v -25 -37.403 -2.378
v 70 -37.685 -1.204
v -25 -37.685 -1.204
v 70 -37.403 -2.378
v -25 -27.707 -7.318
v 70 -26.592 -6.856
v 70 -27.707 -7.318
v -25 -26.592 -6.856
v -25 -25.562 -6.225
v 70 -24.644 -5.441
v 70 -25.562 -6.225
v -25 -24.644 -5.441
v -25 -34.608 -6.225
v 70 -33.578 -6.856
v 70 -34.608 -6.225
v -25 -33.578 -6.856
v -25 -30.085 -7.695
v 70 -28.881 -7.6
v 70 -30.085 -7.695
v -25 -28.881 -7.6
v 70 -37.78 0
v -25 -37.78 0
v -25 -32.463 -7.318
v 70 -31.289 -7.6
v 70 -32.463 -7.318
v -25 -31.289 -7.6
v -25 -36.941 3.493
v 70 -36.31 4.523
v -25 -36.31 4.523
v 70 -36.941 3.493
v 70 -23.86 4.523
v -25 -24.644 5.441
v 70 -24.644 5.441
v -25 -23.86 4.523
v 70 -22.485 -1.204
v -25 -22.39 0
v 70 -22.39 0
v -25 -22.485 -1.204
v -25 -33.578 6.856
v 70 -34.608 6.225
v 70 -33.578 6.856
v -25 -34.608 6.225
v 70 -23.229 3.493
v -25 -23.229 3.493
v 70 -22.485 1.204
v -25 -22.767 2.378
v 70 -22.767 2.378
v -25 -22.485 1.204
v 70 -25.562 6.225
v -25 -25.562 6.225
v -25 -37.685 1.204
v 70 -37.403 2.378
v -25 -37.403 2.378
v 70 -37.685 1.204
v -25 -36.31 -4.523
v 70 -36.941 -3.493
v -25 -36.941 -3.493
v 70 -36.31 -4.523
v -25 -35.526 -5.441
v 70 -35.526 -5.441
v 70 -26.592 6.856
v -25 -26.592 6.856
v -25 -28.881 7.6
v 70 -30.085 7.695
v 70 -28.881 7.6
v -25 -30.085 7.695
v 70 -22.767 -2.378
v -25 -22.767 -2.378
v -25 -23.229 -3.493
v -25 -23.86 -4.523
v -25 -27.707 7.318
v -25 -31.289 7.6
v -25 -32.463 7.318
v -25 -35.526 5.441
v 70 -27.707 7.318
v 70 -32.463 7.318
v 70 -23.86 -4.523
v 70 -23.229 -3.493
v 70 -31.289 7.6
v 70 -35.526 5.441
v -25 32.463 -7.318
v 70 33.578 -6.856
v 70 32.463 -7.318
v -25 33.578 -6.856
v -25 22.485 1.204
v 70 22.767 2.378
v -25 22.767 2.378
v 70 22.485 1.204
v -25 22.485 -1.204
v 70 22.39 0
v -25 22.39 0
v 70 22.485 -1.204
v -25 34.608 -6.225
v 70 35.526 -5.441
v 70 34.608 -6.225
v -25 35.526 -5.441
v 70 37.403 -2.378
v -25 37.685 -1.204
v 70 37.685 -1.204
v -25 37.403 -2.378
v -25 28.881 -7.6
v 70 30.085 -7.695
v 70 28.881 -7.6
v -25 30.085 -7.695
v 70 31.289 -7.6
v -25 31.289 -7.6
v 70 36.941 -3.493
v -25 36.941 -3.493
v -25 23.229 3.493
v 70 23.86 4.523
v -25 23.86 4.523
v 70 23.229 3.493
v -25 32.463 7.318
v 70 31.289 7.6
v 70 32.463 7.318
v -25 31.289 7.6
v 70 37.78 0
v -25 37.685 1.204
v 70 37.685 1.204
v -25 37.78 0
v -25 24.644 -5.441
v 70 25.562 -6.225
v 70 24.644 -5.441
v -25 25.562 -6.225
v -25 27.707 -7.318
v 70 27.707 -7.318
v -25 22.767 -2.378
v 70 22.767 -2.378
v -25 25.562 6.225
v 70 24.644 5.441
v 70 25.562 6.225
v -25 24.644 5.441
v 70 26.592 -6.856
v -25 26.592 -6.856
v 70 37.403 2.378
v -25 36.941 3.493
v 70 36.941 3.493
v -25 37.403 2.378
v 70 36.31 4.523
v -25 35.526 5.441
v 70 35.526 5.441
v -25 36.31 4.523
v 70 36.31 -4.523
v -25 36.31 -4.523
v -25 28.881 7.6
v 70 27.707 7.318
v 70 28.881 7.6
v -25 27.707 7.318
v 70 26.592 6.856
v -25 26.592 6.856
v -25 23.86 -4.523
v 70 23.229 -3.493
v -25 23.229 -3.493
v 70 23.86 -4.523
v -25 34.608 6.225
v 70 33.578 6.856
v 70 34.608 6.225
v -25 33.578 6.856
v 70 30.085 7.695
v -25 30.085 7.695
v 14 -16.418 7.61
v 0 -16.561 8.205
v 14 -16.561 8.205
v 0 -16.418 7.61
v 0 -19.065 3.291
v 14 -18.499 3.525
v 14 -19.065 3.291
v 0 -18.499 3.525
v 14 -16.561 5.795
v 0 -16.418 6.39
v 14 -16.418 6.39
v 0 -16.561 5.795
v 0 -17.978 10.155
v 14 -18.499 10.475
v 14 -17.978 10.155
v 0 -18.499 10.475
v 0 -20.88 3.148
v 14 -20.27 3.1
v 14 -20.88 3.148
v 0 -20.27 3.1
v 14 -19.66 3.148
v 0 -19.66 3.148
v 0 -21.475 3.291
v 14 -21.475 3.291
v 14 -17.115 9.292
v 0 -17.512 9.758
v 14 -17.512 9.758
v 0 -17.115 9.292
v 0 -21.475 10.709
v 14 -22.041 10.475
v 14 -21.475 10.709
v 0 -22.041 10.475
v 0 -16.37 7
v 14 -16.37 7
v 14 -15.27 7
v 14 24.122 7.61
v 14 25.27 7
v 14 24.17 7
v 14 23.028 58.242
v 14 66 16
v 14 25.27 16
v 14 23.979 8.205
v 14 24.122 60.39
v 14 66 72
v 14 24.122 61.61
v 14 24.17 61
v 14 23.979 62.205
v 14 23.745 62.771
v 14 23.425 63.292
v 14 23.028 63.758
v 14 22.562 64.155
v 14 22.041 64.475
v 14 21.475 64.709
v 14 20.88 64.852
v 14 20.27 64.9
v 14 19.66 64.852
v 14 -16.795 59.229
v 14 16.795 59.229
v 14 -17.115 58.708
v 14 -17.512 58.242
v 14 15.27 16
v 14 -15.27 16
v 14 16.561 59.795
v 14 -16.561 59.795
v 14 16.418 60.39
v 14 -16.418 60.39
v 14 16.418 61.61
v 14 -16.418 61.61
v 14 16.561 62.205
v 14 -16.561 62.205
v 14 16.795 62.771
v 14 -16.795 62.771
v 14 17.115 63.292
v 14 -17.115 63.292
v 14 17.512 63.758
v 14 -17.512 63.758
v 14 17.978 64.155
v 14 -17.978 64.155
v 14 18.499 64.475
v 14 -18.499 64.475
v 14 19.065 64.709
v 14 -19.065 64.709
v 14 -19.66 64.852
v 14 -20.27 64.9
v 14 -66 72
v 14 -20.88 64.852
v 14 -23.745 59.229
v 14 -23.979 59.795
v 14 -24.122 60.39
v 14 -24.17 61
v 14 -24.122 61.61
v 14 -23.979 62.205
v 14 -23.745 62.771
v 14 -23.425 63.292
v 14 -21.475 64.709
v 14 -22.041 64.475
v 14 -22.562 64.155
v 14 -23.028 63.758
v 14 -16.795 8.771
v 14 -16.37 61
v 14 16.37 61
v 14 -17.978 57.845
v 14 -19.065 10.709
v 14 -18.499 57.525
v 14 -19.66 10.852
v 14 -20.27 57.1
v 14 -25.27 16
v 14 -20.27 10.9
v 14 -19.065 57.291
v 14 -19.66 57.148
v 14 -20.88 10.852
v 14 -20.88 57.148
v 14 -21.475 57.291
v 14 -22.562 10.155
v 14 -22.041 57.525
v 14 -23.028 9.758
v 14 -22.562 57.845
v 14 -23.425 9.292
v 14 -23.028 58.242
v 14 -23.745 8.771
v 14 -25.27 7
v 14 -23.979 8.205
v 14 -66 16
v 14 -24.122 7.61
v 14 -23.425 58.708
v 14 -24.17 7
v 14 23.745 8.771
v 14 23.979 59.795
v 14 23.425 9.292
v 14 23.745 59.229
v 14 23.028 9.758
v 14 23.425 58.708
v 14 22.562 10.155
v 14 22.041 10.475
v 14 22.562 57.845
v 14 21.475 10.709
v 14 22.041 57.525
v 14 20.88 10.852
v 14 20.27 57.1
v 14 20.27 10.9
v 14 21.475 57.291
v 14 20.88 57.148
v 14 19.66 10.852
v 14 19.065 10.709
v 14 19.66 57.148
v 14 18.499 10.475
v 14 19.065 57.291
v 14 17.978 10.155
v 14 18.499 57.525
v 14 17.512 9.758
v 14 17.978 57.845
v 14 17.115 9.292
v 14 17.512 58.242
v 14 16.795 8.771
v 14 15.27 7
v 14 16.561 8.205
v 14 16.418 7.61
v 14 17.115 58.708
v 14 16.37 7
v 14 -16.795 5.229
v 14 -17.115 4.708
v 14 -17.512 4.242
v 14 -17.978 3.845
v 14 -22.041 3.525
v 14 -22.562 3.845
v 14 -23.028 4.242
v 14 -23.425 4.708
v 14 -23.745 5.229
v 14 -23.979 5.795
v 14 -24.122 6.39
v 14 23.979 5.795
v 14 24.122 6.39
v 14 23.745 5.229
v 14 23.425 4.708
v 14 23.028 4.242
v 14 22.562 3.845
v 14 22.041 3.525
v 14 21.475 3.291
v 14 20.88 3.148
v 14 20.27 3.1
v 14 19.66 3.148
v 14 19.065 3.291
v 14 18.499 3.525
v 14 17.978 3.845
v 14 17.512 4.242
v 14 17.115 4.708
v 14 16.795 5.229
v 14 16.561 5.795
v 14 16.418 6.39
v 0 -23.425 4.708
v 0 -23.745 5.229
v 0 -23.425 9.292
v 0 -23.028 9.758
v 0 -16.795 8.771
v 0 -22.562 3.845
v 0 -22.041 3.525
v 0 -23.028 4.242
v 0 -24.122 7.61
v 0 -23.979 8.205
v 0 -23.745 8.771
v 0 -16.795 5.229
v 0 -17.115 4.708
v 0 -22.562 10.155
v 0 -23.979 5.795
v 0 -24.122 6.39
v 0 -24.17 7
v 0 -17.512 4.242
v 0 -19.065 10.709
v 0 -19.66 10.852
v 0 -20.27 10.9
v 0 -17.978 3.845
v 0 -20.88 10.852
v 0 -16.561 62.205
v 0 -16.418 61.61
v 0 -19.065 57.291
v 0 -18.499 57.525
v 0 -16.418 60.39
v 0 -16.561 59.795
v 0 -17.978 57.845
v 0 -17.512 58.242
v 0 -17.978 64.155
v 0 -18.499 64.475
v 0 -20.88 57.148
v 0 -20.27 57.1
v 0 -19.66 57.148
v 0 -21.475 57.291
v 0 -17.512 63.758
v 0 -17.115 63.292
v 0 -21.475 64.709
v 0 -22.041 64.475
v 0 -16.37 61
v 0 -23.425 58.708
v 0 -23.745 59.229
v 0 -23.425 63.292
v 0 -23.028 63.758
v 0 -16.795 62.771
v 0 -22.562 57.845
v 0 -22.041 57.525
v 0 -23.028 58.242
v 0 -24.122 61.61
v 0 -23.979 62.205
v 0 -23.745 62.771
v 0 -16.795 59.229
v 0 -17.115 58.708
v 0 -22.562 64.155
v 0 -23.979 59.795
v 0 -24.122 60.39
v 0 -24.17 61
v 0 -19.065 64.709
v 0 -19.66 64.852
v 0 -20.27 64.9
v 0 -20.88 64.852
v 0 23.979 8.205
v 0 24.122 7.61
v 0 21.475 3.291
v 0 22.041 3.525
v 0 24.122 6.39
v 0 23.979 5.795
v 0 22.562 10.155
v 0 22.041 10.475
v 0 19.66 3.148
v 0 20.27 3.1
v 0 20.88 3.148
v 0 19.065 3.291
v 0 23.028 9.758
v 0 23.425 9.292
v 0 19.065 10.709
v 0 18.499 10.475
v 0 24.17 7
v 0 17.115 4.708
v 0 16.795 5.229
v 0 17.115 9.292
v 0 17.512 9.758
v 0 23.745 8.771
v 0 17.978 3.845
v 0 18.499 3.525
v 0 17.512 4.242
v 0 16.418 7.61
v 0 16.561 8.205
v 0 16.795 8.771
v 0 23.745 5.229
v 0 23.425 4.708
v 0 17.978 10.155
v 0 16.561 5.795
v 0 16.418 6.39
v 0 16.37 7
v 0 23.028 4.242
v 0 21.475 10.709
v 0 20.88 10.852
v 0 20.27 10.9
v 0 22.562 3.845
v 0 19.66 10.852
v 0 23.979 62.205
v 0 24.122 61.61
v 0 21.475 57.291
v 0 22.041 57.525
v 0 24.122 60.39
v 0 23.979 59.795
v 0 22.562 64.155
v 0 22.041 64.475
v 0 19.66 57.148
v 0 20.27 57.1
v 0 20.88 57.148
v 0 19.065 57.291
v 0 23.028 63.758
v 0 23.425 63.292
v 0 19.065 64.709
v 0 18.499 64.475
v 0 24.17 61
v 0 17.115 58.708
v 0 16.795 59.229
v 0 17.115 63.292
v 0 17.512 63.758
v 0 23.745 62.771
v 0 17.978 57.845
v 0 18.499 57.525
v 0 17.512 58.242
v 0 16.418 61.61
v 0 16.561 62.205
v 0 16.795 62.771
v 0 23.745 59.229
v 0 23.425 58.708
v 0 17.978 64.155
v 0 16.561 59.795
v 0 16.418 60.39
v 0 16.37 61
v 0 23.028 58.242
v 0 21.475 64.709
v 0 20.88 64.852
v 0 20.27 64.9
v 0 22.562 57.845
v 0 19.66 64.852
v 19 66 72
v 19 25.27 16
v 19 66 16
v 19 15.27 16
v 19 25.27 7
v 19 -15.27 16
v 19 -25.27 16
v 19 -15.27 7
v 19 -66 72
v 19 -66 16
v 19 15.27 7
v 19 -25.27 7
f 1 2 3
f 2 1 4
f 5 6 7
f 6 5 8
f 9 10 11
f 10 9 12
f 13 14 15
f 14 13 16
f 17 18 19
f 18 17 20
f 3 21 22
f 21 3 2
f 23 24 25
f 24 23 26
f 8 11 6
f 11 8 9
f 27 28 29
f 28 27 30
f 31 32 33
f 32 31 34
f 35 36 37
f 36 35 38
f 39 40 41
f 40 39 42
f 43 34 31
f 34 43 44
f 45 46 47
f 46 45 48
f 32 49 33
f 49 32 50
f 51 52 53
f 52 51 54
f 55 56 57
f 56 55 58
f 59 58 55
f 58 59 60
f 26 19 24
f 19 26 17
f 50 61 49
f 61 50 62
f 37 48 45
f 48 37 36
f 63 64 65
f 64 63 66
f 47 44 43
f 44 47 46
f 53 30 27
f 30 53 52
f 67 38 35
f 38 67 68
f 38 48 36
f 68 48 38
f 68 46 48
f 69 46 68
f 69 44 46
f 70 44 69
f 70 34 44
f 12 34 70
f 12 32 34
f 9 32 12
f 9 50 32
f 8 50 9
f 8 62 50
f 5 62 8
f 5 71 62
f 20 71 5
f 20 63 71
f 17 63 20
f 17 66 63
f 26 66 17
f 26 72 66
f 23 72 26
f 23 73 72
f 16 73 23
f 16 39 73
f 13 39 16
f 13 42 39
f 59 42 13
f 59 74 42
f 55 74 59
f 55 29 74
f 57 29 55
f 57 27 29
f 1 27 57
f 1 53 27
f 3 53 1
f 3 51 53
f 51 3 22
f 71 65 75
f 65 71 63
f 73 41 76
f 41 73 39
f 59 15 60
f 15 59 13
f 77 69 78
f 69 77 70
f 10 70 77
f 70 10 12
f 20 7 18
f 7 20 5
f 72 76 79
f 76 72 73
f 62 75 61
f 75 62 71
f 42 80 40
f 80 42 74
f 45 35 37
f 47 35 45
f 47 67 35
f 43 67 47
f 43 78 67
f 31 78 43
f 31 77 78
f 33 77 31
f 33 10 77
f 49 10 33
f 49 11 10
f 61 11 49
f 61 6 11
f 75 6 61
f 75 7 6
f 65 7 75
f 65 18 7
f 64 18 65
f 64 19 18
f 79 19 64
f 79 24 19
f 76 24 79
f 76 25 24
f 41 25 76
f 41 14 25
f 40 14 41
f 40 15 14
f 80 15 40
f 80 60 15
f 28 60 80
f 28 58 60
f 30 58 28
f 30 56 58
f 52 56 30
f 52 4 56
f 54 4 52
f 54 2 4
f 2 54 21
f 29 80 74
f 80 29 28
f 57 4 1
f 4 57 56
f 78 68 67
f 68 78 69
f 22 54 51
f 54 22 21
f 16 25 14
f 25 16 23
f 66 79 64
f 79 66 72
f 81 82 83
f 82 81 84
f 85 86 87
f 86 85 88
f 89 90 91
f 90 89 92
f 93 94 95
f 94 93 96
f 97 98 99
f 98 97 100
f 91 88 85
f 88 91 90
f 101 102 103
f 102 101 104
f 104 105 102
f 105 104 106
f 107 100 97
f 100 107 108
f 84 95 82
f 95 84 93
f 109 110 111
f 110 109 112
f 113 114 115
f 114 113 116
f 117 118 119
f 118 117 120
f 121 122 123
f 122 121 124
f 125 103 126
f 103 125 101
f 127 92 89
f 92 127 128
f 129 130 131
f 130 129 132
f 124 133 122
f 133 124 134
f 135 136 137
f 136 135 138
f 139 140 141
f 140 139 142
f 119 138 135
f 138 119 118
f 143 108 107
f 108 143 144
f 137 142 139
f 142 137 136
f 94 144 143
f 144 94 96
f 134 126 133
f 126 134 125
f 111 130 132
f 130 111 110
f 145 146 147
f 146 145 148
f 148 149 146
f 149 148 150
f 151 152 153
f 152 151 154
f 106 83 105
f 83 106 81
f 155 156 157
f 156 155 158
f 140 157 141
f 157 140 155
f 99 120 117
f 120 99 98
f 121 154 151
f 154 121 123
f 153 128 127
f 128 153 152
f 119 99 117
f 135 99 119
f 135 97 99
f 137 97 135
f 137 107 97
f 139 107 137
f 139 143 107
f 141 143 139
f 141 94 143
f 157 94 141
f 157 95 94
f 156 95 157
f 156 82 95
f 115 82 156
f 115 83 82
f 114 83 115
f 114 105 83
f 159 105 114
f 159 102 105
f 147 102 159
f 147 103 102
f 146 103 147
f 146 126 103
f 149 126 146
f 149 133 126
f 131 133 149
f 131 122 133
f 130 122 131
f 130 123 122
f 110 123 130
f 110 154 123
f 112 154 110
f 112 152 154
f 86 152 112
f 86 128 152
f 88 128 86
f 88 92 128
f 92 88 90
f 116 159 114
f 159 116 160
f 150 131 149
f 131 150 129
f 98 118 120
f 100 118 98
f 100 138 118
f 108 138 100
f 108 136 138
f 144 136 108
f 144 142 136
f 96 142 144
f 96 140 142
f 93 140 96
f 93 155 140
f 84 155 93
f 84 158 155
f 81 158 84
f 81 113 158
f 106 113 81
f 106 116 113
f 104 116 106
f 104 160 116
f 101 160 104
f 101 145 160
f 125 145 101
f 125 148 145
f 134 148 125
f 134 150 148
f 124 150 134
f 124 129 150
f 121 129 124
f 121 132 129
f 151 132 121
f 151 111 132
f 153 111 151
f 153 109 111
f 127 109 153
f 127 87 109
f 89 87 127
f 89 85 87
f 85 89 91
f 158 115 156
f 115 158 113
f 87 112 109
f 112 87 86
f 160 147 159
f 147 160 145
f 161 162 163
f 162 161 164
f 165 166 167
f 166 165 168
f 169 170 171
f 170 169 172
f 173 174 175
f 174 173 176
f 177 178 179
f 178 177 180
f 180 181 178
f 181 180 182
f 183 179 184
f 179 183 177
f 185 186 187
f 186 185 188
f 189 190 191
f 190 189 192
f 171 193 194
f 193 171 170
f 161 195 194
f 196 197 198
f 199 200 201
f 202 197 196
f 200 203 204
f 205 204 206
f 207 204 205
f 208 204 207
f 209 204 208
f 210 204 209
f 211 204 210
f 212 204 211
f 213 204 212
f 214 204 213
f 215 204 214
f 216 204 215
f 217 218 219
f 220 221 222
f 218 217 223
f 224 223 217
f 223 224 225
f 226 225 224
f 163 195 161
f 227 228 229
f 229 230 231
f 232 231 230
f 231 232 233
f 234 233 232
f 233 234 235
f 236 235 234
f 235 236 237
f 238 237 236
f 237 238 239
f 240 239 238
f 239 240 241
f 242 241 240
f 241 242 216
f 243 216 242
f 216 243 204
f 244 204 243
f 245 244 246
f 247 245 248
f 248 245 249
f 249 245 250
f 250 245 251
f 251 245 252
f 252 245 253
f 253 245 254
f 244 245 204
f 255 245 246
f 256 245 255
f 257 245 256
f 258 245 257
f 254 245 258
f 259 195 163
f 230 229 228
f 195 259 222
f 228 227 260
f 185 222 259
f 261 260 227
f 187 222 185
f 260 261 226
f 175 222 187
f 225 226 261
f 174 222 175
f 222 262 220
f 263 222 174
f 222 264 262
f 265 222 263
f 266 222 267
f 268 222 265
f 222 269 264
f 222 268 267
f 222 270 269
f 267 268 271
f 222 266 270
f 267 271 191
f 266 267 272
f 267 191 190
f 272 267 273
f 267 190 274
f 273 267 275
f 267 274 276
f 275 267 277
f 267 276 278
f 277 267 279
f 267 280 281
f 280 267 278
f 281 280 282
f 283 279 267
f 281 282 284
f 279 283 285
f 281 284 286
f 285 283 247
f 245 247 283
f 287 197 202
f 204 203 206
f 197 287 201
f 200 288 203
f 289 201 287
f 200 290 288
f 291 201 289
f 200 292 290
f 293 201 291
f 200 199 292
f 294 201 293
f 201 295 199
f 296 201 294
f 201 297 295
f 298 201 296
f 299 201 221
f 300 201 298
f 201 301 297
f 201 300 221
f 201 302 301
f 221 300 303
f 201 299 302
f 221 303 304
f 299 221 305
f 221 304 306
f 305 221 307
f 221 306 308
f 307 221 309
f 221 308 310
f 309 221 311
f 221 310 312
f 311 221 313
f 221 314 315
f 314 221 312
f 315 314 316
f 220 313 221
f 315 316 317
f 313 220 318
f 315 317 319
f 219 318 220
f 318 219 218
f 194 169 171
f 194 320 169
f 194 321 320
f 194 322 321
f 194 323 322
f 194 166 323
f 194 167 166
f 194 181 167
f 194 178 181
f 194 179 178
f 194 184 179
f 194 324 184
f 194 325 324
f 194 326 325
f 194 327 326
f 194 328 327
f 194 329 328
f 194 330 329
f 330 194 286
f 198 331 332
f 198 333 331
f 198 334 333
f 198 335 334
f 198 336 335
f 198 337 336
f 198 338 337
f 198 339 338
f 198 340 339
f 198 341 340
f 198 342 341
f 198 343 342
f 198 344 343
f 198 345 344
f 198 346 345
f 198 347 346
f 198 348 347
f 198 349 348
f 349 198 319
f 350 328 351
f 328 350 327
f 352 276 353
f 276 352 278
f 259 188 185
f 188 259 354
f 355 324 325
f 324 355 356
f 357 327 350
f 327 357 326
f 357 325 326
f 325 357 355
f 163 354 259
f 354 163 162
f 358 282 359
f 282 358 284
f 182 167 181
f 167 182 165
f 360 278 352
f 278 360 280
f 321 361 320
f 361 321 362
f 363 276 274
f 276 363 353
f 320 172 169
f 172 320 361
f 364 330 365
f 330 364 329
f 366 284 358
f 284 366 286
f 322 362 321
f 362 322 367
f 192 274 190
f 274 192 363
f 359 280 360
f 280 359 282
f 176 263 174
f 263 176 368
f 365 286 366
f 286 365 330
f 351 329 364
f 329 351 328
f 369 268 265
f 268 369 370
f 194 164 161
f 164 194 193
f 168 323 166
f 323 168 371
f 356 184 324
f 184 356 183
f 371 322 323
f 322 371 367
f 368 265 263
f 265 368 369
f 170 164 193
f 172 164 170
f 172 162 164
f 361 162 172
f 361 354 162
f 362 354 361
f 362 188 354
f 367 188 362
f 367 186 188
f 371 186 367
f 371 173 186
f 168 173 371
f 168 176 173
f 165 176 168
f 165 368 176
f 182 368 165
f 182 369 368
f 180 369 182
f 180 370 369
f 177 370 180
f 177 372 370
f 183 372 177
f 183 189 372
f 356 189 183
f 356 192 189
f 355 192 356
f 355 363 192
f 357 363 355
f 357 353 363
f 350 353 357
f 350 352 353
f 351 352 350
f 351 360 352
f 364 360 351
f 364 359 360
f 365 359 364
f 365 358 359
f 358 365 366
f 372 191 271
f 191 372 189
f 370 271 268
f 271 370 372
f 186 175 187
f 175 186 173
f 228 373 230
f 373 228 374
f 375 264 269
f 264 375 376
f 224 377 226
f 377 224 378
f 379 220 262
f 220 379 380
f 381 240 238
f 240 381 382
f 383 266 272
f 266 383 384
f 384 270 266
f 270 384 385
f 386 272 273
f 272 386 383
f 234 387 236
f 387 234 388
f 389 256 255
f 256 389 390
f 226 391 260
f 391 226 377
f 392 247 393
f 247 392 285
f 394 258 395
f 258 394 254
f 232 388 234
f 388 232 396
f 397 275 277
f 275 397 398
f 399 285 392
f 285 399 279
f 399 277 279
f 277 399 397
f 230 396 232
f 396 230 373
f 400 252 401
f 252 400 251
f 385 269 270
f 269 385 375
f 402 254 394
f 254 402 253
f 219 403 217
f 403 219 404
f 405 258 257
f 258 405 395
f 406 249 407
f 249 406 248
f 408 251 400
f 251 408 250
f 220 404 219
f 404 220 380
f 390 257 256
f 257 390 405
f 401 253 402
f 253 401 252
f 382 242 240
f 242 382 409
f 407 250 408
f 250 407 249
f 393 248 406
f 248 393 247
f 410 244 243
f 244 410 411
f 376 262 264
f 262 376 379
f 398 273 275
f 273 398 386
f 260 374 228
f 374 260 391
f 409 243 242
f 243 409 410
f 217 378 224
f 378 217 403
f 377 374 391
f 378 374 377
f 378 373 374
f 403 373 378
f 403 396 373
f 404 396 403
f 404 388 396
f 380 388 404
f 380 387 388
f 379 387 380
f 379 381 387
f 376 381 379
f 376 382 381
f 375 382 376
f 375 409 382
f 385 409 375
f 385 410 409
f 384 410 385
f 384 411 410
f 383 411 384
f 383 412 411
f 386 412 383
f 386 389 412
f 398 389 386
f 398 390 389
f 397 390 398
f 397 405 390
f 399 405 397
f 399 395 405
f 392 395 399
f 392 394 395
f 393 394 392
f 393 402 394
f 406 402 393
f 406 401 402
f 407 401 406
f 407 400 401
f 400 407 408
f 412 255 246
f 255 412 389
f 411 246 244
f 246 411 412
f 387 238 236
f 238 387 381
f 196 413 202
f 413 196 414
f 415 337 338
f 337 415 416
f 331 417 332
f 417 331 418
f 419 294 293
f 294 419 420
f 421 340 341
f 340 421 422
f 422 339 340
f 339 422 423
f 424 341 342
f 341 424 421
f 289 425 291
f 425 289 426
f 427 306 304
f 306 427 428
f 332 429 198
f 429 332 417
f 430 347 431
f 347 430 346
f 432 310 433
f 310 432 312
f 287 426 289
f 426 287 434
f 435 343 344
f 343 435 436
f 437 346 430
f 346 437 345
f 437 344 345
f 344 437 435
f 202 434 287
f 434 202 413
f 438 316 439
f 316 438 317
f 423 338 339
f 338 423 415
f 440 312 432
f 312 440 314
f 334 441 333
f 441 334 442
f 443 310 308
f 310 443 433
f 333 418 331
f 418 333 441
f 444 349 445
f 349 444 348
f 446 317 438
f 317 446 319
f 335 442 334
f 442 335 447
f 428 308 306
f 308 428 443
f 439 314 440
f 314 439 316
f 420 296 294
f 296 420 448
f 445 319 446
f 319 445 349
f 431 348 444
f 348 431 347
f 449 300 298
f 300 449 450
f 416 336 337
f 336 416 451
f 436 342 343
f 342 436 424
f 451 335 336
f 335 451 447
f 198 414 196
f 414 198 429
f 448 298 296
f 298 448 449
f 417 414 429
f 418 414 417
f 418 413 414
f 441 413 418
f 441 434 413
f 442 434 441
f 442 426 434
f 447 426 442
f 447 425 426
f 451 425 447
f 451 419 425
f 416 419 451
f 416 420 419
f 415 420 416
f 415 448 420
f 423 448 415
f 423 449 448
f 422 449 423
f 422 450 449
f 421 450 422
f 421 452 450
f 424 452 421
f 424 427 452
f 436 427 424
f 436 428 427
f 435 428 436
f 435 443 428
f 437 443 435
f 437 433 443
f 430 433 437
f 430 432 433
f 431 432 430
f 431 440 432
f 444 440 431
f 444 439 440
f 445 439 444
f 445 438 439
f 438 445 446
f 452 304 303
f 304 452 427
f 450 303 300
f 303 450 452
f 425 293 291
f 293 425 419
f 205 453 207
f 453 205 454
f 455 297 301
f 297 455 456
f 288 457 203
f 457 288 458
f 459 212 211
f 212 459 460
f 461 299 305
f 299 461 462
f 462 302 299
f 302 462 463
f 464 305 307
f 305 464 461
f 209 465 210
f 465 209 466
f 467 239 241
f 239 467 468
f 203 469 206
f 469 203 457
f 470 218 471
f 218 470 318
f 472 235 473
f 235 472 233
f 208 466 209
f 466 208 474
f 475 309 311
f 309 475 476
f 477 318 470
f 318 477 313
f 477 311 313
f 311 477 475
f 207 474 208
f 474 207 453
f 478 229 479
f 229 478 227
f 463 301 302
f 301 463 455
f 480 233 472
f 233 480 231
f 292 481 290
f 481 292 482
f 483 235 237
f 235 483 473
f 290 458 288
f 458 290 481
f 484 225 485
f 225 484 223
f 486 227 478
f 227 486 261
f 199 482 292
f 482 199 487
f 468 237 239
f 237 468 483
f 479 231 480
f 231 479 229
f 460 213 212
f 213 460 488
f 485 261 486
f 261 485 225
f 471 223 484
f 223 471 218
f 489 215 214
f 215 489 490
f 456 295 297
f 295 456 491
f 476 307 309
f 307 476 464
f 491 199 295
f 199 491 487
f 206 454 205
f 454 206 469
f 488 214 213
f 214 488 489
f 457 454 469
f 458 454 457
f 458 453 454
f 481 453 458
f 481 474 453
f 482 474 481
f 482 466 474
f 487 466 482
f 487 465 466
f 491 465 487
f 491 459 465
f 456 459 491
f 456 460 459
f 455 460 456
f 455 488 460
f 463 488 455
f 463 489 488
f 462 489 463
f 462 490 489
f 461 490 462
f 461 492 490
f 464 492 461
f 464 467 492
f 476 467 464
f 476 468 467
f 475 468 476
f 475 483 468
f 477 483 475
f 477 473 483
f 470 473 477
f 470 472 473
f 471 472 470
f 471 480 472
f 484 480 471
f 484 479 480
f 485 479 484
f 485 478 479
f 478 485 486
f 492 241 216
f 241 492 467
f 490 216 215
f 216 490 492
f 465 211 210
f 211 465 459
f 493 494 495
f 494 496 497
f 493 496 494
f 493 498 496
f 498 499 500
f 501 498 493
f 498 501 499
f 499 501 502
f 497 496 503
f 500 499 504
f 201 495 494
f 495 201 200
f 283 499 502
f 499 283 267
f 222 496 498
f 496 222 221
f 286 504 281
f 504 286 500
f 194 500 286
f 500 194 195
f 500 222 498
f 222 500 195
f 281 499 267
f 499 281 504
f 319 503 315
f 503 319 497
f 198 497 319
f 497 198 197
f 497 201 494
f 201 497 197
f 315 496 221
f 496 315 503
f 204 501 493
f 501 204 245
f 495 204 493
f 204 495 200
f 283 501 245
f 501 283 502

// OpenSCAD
// Tube-clearance check for the shifted RSD plate (concept, not for print)
// Stack coords: X = out from the +X face; Y = across; Z = up.
$fn = 40;

GY = 20.27;  ZN = 7;  ZO = 61;        // +X inserts: Y=±20.27, Z=7 (Nano) & 61 (Orin)
SO_D = 7.8;  SO_L = 14;               // standoffs Ø7.8 × 14
RSD_Y = 120.18; RSD_Z = 51.83; RSD_CLR = 4.5;
PT = 5; SHIFT = 10;
PZc = (ZN + ZO)/2 + SHIFT;            // plate center Z = 44
PZ0 = PZc - 28; PZ1 = PZc + 28;       // plate Z 16..72
PX  = SO_L;                           // plate inner face at X=14

// --- GNSS tubes (run along +X at Y=±30.085, Z=0) ---
color([0.55,0.42,0.62,0.5])
for (sy=[-1,1]) translate([-25, sy*30.085, 0]) rotate([0,90,0]) cylinder(d=15.39, h=95);

// --- proposed part ---
color([0.30,0.50,0.72,0.95]) {
  // 4 standoffs to the grid
  for (sy=[-1,1], z=[ZN,ZO]) translate([0, sy*GY, z]) rotate([0,90,0]) cylinder(d=SO_D, h=SO_L);
  // RSD plate (shifted up)
  translate([PX, -66, PZ0]) cube([PT, 132, PZ1-PZ0]);
  // lower arms from plate down to the lower standoffs
  for (sy=[-1,1]) translate([PX, sy*GY-5, ZN]) cube([PT, 10, PZ0-ZN]);
}
